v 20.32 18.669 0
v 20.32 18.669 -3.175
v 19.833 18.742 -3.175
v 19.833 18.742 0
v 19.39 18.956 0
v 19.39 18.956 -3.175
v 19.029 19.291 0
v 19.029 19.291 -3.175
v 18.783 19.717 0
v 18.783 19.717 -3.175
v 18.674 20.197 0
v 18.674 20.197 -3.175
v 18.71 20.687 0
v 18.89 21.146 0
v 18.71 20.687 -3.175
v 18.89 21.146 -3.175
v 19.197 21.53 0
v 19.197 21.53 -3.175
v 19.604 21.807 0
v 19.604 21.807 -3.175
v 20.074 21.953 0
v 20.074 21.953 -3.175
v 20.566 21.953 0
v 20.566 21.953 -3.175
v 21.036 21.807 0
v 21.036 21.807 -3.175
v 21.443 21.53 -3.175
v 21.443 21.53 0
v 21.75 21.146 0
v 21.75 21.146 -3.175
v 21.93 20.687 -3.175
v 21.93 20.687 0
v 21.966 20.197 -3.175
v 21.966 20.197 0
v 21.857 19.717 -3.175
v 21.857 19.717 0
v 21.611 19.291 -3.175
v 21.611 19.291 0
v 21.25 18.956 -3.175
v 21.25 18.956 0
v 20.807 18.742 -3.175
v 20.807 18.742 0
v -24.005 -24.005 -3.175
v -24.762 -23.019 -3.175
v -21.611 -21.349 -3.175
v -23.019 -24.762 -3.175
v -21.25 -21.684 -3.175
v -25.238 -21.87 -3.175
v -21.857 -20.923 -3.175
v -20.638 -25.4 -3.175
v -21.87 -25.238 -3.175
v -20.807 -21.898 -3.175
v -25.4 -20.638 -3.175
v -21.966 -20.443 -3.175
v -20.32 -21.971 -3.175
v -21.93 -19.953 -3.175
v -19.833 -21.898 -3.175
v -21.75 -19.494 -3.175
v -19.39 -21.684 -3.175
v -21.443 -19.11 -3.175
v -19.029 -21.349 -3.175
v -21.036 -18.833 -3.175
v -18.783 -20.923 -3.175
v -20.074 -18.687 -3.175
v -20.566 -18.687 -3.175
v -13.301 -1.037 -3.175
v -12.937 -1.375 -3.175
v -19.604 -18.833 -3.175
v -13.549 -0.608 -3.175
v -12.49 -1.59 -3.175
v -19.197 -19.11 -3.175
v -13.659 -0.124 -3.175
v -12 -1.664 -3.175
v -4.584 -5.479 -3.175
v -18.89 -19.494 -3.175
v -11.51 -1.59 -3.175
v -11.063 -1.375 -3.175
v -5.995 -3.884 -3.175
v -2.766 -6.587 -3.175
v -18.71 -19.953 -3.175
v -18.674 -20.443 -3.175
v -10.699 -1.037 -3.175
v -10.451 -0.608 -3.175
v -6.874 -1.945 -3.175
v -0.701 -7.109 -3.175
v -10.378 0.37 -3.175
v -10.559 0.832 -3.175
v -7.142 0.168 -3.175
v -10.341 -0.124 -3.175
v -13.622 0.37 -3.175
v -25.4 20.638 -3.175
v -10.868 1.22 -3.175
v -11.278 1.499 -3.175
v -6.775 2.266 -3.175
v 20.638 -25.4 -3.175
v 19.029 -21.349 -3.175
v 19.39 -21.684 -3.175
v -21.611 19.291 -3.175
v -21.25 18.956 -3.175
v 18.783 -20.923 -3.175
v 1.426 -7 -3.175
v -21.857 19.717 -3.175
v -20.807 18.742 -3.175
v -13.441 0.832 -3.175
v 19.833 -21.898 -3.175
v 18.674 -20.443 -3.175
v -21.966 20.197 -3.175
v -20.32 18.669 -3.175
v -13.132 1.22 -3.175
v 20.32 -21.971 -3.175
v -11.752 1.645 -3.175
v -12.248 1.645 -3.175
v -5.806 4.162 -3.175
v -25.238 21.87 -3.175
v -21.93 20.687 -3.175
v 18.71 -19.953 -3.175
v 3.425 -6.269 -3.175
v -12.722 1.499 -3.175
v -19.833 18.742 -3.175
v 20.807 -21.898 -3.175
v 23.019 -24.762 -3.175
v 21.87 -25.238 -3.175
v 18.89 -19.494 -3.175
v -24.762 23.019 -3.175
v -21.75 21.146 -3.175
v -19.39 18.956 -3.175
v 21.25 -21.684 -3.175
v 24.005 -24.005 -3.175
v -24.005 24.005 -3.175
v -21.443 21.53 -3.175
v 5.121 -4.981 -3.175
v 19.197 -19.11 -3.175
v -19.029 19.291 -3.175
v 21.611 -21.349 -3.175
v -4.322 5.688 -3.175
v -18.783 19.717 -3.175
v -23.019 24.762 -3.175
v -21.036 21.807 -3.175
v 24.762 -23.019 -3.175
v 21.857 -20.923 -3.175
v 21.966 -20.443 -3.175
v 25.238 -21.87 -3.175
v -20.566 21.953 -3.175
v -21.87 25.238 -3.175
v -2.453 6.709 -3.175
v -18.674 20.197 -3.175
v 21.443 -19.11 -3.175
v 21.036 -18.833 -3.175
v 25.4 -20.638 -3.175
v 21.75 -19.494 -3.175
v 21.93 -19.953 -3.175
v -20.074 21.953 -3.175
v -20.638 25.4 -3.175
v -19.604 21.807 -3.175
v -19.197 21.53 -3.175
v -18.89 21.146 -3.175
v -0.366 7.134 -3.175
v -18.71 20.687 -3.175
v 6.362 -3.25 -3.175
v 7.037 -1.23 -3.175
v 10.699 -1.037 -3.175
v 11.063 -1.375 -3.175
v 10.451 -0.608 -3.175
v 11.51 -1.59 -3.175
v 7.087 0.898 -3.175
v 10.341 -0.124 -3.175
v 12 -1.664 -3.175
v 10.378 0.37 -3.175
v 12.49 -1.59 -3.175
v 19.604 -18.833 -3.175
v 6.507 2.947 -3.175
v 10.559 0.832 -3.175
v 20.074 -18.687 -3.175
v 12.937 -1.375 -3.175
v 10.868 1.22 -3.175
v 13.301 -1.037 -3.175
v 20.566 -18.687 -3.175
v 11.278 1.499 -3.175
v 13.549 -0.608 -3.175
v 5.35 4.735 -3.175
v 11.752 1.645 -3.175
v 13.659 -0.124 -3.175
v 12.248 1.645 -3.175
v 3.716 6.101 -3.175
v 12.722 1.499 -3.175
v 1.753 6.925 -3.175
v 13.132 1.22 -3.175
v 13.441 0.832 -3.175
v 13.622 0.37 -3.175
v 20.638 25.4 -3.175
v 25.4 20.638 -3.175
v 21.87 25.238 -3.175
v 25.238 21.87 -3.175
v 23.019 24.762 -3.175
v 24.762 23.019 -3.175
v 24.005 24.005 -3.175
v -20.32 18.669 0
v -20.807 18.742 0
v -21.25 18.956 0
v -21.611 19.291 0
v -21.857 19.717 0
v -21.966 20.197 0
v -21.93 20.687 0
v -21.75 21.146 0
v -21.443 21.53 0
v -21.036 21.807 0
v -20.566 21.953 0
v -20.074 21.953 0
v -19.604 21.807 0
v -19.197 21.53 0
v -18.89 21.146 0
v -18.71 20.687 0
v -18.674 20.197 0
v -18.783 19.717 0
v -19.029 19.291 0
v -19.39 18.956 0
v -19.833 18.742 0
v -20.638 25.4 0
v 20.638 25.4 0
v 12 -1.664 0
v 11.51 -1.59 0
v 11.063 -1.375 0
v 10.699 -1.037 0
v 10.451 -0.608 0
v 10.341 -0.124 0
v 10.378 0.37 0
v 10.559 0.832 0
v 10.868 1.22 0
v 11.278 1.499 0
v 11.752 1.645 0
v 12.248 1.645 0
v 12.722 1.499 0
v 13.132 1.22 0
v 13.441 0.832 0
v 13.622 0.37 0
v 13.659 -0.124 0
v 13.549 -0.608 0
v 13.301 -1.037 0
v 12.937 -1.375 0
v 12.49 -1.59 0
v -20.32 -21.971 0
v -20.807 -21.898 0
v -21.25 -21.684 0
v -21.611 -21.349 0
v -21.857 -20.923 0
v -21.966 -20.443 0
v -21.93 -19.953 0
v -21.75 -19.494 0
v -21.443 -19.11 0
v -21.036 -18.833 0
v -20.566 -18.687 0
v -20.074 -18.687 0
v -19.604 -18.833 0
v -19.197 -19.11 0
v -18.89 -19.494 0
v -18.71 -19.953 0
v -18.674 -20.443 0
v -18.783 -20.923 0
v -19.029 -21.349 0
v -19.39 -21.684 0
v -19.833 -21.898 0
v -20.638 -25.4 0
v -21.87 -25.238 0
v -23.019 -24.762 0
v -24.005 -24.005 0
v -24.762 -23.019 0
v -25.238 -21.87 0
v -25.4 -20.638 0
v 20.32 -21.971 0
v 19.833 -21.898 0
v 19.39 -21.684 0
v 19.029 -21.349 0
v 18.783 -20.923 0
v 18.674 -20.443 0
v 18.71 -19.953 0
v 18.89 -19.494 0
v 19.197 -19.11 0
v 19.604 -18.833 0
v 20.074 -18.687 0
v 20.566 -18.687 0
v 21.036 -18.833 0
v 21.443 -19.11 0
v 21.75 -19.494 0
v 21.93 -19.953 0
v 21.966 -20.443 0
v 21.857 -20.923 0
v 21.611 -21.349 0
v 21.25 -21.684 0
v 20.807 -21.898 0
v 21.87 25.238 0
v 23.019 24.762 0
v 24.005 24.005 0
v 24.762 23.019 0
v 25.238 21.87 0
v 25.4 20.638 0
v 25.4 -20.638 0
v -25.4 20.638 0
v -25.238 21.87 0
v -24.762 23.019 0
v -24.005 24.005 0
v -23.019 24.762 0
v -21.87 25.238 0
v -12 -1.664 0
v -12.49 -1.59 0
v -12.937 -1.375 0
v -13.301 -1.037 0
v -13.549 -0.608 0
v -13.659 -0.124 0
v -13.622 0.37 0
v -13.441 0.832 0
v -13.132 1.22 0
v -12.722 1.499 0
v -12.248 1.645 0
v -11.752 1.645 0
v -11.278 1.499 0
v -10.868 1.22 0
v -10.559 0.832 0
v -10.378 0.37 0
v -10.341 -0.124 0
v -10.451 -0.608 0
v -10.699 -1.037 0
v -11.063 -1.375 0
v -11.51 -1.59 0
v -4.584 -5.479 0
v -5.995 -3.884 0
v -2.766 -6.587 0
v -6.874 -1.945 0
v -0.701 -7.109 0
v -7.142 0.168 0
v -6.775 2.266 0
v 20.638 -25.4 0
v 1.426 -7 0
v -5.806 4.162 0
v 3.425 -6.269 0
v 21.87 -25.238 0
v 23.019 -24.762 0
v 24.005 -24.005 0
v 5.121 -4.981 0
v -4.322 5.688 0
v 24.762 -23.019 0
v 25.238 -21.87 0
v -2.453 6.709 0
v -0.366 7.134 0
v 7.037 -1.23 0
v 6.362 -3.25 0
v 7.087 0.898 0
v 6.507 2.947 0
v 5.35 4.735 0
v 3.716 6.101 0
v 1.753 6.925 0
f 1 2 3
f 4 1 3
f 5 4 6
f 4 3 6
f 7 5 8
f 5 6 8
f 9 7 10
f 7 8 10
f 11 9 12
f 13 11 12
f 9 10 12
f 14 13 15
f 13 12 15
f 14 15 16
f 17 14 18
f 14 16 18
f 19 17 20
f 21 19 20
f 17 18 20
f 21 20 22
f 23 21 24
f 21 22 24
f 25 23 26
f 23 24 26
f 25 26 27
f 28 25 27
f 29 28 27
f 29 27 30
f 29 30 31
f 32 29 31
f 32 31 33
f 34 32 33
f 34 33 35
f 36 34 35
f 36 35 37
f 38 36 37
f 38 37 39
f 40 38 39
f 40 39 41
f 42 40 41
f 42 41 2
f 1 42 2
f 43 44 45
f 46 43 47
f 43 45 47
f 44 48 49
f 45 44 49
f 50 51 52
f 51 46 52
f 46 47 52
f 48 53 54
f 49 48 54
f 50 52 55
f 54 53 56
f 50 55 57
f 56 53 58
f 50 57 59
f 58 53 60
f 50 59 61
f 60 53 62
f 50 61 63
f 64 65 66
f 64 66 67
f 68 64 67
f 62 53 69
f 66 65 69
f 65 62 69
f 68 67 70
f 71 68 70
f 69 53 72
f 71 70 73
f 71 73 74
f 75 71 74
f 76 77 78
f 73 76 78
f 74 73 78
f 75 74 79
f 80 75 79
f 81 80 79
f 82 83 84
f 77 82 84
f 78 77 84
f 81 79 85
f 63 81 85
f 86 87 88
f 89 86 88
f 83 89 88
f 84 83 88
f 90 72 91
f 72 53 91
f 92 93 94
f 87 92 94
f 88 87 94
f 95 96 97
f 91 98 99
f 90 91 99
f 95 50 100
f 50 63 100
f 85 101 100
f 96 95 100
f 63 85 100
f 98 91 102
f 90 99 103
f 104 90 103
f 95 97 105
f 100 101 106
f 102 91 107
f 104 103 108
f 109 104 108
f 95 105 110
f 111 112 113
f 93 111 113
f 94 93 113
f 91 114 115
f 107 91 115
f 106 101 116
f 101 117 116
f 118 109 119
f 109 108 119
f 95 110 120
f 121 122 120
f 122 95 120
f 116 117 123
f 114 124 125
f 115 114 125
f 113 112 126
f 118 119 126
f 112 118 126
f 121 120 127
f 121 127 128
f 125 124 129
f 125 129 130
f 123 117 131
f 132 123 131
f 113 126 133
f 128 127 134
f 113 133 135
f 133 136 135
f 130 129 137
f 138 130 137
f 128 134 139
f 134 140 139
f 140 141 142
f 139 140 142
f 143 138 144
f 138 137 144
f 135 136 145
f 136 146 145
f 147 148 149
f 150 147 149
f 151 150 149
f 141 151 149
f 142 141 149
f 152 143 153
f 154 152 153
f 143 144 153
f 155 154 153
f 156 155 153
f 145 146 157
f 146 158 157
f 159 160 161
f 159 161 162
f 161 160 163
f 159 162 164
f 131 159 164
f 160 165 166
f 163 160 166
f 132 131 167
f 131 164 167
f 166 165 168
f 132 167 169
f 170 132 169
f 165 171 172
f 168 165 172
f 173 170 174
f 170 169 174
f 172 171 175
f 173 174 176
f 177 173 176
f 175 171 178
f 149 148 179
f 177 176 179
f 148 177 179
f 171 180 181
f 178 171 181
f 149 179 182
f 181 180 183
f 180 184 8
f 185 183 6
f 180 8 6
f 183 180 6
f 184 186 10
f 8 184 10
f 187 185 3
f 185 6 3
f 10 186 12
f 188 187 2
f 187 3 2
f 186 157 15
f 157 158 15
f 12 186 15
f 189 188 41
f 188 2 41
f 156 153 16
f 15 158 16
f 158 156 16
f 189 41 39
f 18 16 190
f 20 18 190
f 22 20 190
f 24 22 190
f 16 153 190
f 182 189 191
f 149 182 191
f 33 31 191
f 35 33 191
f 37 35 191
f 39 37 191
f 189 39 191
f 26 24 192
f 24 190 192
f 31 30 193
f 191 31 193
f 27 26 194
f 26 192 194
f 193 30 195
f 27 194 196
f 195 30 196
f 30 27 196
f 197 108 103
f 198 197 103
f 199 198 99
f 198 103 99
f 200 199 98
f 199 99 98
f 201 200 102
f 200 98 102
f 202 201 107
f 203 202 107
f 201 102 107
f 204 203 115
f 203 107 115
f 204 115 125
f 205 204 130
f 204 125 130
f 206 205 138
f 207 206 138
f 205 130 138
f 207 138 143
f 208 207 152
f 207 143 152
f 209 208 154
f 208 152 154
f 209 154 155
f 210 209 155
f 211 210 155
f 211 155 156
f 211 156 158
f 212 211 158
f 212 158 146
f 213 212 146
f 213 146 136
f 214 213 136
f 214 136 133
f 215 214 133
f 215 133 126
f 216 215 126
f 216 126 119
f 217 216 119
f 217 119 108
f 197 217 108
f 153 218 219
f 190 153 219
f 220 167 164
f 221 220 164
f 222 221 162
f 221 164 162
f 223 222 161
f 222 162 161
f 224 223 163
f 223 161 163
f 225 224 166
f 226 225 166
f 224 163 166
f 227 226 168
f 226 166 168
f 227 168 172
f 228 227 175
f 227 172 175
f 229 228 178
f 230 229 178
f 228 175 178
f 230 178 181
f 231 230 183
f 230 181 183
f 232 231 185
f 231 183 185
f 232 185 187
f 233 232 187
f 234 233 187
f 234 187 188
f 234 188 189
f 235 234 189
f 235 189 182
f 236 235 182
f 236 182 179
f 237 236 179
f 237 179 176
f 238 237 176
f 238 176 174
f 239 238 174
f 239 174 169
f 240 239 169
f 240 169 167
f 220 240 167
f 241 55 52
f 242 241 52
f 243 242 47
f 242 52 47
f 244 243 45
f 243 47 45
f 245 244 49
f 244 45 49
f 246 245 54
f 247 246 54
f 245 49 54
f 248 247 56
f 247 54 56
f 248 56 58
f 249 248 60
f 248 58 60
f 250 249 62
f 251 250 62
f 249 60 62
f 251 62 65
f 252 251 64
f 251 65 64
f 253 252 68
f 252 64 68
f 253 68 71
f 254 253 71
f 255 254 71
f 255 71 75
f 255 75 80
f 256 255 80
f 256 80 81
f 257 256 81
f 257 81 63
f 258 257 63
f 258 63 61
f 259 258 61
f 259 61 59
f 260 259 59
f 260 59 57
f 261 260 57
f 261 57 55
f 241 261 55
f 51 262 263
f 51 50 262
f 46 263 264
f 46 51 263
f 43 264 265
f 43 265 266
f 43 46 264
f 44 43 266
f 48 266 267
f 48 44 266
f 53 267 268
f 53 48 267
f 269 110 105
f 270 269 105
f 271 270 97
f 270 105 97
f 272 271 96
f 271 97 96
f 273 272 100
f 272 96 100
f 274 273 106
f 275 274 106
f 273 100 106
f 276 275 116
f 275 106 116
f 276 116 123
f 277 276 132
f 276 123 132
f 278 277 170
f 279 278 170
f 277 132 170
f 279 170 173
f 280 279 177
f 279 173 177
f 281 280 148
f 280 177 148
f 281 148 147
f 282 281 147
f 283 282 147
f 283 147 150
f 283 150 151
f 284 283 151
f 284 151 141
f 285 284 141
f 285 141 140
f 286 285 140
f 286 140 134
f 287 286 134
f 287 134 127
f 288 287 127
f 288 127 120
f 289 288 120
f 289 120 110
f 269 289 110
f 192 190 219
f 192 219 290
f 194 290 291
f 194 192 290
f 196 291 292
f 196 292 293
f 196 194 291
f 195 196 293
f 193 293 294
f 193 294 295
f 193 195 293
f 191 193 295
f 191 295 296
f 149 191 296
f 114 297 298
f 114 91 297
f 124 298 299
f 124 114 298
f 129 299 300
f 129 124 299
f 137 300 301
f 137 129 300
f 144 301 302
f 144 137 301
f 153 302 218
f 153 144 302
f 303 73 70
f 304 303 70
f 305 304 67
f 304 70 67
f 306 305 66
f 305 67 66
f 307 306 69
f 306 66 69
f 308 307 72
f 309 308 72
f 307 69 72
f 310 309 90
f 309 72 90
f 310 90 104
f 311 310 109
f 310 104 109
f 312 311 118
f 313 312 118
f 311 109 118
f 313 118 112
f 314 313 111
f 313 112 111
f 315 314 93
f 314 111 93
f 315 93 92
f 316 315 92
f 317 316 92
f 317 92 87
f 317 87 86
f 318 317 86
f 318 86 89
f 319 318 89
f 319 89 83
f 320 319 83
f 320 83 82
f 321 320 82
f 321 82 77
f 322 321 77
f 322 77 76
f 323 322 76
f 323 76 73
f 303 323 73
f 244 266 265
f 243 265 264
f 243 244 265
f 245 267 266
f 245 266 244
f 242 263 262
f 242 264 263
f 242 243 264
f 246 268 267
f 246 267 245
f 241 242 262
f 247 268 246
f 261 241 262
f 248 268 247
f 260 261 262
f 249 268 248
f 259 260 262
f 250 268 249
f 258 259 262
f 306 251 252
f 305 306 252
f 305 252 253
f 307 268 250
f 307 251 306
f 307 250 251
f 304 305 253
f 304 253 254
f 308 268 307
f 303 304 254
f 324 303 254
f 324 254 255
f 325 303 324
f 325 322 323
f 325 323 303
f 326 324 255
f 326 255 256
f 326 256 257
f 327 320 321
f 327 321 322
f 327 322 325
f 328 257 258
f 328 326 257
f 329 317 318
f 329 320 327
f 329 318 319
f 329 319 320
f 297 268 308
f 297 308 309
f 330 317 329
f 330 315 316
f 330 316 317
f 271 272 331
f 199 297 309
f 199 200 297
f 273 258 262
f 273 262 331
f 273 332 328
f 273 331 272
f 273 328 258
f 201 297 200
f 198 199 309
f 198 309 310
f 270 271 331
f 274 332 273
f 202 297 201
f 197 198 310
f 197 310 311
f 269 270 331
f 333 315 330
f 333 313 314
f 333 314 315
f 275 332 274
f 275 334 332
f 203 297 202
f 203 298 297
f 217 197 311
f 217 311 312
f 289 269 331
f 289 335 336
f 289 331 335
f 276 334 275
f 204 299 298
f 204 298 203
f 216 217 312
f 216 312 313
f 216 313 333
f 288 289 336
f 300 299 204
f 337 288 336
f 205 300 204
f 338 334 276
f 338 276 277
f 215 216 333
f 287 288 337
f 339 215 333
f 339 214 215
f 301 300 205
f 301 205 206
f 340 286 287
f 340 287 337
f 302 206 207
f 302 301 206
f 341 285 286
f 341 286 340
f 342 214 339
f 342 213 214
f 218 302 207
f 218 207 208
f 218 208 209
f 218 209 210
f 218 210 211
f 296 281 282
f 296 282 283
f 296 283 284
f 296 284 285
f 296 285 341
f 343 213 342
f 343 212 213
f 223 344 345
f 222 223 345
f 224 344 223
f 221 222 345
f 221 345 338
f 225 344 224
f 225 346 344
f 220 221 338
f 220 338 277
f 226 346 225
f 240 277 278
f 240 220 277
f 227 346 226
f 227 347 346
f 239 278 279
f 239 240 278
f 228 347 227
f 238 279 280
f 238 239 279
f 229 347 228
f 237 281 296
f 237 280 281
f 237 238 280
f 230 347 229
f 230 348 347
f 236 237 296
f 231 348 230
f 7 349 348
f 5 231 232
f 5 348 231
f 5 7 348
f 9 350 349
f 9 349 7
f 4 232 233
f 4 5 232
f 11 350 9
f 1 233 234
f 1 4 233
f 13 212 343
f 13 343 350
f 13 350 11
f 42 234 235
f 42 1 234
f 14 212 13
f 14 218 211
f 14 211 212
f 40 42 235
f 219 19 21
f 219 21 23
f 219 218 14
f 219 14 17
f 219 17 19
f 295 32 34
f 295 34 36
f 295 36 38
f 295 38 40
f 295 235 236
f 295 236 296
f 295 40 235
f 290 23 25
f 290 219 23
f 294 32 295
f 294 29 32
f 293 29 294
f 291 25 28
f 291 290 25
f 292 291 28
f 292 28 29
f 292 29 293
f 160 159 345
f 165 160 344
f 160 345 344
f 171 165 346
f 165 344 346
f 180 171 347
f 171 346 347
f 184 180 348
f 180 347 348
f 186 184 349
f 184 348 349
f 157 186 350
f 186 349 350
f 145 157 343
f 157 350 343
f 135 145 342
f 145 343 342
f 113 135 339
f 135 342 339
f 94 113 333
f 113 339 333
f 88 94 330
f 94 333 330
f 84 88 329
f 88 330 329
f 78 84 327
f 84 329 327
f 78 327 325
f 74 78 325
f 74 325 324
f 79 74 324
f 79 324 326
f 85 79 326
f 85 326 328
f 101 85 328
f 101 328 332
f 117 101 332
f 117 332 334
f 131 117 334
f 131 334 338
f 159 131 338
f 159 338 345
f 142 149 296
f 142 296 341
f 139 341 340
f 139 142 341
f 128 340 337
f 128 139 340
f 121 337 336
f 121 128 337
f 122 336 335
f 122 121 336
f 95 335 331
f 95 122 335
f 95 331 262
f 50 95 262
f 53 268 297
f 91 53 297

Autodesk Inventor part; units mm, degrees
ref_plane "YZ Plane" through (0, 0, 0) normal (1, 0, 0) x (0, 1, 0)
ref_plane "XZ Plane" through (0, 0, 0) normal (0, 1, 0) x (-1, 0, 0)
ref_plane "XY Plane" through (0, 0, 0) normal (0, 0, 1) x (1, 0, 0)
sketch "Sketch1" plane through (0, 0, 0) normal (0, 0, 1) x (1, 0, 0)
  line L0 (-13, 12) -> (13, 12)
  line L1 (13, 12) -> (13, -12)
  line L2 (13, -12) -> (-13, -12)
  line L3 (-13, -12) -> (-13, 12)
  line L4 (-13, 3.25) -> (-15, 3.25)
  line L5 (-15, 3.25) -> (-15, -3.25)
  line L6 (-15, -3.25) -> (-13, -3.25)
  line L7 (-13, -3.25) -> (-13, 3.25)
  line L8 (13, 3.25) -> (15, 3.25)
  line L9 (15, 3.25) -> (15, -3.25)
  line L10 (15, -3.25) -> (13, -3.25)
  line L11 (13, -3.25) -> (13, 3.25)
  line L12 (-25.4, 25.4) -> (25.4, 25.4)
  line L13 (25.4, 25.4) -> (25.4, -25.4)
  line L14 (25.4, -25.4) -> (-25.4, -25.4)
  line L15 (-25.4, -25.4) -> (-25.4, 25.4)
  arc A0 (6.3617, 3.25) -> (-6.3617, 3.25) centre (0, 0) ccw
  circle A1 centre (-3, 12) radius 1.5
  line L16 (-13, 8) -> (-9, 12)
  line L17 (9, 12) -> (13, 8)
  line L18 (13, -8) -> (9, -12)
  line L19 (-13, -8) -> (-9, -12)
  line L20 (-14, 3.25) -> (14, 3.25)
  line L21 (-14, -3.25) -> (-6.3617, -3.25)
  arc A2 (6.3617, -3.25) -> (6.3617, 3.25) centre (0, 0) ccw
  arc A3 (-6.3617, 3.25) -> (-6.3617, -3.25) centre (0, 0) ccw
  arc A4 (-6.3617, -3.25) -> (6.3617, -3.25) centre (0, 0) ccw
  line L22 (-6.3617, -3.25) -> (14, -3.25)
  line L23 (-15, 3.25) -> (15, 3.25)
  line L24 (15, 3.25) -> (15, -3.25)
  line L25 (15, -3.25) -> (-15, -3.25)
  line L26 (-15, -3.25) -> (-15, 3.25)
  point P0 (-20.32, 20.32)
  point P1 (20.32, 20.32)
  point P2 (20.32, -20.32)
  point P3 (-20.32, -20.32)
  point P4 (-12, 0)
  point P5 (12, 0)
  dimension "d53" = 3.302
  dimension "d0" = 24
  dimension "d1" = 12
  dimension "d2" = 26
  dimension "d3" = 13
  dimension "d4" = 2
  dimension "d5" = 6.5
  dimension "d6" = 3.25
  dimension "d7" = 2
  dimension "d8" = 14.2875
  dimension "d9" = 50.8
  dimension "d10" = 25.4
  dimension "d11" = 50.8
  dimension "d12" = 25.4
  dimension "d13" = 3
  dimension "d14" = 10
  dimension "d15" = 4
  dimension "d16" = 4
  dimension "d17" = 4
  dimension "d18" = 4
  dimension "d19" = 4
  dimension "d20" = 5.08
  dimension "d21" = 5.08
  dimension "d22" = 5.08
  dimension "d23" = 5.08
  dimension "d34" = 40.64
  dimension "d35" = 40.64
  dimension "d61" = 12
  dimension "d62" = 12
extrude "Extrusion1" add sketch "Sketch1" against normal blind 3.175 contours L0 L16 L3 | L0 A1 L17 L1 L20 A0 L3 L16 | A1 L0 | L0 A1 | L20 A3 L21 L3 | L3 L6 L5 L4 | L21 A4 L22 L1 L18 L2 L19 L3 | A0 L20 | L20 A2 L22 A3 | L0 L1 L17 | L19 L2 L3 | L22 A4 | L20 L1 L22 A2 | L8 L9 L10 L1 | L18 L1 L2 | L12 L13 L14 L15
fillet "Fillet2" radius 4.7625 4 edges at (25.4, 25.4, -1.5875) (25.4, -25.4, -1.5875) (-25.4, 25.4, -1.5875) (-25.4, -25.4, -1.5875)
hole "Hole2" at (-20.32, 20.32, 0) at (20.32, 20.32, 0) at (20.32, -20.32, 0) at (-20.32, -20.32, 0) direction (0, 0, -1) diameter 3.302 end through all thread size "8-32 UNC" class "2B" standard "ANSI Unified Screw Threads"
extrude "Extrusion6" cut sketch "Sketch1" against normal through all contours A0 L20 | L20 A2 L22 A3 | L22 A4
hole "Hole3" at (-12, 0, 0) at (12, 0, 0) direction (0, 0, -1) diameter 3.3274 end through all
equation "\"d1\" = 0.5 * d0"
equation "\"d3\" = 0.5 * d2"
equation "\"d6\" = 0.5 * d5"
equation "\"d7\" = d4"
equation "\"d10\" = 0.5 * d9"
equation "\"d12\" = 0.5 * d11"
equation "\"d16\" = d15"
equation "\"d17\" = d15"
equation "\"d18\" = d15"
equation "\"d19\" = d15"
equation "\"d22\" = d21"
equation "\"d23\" = d21"
equation "\"d62\" = d61"
properties part number "BD gearbox mount top plate"
